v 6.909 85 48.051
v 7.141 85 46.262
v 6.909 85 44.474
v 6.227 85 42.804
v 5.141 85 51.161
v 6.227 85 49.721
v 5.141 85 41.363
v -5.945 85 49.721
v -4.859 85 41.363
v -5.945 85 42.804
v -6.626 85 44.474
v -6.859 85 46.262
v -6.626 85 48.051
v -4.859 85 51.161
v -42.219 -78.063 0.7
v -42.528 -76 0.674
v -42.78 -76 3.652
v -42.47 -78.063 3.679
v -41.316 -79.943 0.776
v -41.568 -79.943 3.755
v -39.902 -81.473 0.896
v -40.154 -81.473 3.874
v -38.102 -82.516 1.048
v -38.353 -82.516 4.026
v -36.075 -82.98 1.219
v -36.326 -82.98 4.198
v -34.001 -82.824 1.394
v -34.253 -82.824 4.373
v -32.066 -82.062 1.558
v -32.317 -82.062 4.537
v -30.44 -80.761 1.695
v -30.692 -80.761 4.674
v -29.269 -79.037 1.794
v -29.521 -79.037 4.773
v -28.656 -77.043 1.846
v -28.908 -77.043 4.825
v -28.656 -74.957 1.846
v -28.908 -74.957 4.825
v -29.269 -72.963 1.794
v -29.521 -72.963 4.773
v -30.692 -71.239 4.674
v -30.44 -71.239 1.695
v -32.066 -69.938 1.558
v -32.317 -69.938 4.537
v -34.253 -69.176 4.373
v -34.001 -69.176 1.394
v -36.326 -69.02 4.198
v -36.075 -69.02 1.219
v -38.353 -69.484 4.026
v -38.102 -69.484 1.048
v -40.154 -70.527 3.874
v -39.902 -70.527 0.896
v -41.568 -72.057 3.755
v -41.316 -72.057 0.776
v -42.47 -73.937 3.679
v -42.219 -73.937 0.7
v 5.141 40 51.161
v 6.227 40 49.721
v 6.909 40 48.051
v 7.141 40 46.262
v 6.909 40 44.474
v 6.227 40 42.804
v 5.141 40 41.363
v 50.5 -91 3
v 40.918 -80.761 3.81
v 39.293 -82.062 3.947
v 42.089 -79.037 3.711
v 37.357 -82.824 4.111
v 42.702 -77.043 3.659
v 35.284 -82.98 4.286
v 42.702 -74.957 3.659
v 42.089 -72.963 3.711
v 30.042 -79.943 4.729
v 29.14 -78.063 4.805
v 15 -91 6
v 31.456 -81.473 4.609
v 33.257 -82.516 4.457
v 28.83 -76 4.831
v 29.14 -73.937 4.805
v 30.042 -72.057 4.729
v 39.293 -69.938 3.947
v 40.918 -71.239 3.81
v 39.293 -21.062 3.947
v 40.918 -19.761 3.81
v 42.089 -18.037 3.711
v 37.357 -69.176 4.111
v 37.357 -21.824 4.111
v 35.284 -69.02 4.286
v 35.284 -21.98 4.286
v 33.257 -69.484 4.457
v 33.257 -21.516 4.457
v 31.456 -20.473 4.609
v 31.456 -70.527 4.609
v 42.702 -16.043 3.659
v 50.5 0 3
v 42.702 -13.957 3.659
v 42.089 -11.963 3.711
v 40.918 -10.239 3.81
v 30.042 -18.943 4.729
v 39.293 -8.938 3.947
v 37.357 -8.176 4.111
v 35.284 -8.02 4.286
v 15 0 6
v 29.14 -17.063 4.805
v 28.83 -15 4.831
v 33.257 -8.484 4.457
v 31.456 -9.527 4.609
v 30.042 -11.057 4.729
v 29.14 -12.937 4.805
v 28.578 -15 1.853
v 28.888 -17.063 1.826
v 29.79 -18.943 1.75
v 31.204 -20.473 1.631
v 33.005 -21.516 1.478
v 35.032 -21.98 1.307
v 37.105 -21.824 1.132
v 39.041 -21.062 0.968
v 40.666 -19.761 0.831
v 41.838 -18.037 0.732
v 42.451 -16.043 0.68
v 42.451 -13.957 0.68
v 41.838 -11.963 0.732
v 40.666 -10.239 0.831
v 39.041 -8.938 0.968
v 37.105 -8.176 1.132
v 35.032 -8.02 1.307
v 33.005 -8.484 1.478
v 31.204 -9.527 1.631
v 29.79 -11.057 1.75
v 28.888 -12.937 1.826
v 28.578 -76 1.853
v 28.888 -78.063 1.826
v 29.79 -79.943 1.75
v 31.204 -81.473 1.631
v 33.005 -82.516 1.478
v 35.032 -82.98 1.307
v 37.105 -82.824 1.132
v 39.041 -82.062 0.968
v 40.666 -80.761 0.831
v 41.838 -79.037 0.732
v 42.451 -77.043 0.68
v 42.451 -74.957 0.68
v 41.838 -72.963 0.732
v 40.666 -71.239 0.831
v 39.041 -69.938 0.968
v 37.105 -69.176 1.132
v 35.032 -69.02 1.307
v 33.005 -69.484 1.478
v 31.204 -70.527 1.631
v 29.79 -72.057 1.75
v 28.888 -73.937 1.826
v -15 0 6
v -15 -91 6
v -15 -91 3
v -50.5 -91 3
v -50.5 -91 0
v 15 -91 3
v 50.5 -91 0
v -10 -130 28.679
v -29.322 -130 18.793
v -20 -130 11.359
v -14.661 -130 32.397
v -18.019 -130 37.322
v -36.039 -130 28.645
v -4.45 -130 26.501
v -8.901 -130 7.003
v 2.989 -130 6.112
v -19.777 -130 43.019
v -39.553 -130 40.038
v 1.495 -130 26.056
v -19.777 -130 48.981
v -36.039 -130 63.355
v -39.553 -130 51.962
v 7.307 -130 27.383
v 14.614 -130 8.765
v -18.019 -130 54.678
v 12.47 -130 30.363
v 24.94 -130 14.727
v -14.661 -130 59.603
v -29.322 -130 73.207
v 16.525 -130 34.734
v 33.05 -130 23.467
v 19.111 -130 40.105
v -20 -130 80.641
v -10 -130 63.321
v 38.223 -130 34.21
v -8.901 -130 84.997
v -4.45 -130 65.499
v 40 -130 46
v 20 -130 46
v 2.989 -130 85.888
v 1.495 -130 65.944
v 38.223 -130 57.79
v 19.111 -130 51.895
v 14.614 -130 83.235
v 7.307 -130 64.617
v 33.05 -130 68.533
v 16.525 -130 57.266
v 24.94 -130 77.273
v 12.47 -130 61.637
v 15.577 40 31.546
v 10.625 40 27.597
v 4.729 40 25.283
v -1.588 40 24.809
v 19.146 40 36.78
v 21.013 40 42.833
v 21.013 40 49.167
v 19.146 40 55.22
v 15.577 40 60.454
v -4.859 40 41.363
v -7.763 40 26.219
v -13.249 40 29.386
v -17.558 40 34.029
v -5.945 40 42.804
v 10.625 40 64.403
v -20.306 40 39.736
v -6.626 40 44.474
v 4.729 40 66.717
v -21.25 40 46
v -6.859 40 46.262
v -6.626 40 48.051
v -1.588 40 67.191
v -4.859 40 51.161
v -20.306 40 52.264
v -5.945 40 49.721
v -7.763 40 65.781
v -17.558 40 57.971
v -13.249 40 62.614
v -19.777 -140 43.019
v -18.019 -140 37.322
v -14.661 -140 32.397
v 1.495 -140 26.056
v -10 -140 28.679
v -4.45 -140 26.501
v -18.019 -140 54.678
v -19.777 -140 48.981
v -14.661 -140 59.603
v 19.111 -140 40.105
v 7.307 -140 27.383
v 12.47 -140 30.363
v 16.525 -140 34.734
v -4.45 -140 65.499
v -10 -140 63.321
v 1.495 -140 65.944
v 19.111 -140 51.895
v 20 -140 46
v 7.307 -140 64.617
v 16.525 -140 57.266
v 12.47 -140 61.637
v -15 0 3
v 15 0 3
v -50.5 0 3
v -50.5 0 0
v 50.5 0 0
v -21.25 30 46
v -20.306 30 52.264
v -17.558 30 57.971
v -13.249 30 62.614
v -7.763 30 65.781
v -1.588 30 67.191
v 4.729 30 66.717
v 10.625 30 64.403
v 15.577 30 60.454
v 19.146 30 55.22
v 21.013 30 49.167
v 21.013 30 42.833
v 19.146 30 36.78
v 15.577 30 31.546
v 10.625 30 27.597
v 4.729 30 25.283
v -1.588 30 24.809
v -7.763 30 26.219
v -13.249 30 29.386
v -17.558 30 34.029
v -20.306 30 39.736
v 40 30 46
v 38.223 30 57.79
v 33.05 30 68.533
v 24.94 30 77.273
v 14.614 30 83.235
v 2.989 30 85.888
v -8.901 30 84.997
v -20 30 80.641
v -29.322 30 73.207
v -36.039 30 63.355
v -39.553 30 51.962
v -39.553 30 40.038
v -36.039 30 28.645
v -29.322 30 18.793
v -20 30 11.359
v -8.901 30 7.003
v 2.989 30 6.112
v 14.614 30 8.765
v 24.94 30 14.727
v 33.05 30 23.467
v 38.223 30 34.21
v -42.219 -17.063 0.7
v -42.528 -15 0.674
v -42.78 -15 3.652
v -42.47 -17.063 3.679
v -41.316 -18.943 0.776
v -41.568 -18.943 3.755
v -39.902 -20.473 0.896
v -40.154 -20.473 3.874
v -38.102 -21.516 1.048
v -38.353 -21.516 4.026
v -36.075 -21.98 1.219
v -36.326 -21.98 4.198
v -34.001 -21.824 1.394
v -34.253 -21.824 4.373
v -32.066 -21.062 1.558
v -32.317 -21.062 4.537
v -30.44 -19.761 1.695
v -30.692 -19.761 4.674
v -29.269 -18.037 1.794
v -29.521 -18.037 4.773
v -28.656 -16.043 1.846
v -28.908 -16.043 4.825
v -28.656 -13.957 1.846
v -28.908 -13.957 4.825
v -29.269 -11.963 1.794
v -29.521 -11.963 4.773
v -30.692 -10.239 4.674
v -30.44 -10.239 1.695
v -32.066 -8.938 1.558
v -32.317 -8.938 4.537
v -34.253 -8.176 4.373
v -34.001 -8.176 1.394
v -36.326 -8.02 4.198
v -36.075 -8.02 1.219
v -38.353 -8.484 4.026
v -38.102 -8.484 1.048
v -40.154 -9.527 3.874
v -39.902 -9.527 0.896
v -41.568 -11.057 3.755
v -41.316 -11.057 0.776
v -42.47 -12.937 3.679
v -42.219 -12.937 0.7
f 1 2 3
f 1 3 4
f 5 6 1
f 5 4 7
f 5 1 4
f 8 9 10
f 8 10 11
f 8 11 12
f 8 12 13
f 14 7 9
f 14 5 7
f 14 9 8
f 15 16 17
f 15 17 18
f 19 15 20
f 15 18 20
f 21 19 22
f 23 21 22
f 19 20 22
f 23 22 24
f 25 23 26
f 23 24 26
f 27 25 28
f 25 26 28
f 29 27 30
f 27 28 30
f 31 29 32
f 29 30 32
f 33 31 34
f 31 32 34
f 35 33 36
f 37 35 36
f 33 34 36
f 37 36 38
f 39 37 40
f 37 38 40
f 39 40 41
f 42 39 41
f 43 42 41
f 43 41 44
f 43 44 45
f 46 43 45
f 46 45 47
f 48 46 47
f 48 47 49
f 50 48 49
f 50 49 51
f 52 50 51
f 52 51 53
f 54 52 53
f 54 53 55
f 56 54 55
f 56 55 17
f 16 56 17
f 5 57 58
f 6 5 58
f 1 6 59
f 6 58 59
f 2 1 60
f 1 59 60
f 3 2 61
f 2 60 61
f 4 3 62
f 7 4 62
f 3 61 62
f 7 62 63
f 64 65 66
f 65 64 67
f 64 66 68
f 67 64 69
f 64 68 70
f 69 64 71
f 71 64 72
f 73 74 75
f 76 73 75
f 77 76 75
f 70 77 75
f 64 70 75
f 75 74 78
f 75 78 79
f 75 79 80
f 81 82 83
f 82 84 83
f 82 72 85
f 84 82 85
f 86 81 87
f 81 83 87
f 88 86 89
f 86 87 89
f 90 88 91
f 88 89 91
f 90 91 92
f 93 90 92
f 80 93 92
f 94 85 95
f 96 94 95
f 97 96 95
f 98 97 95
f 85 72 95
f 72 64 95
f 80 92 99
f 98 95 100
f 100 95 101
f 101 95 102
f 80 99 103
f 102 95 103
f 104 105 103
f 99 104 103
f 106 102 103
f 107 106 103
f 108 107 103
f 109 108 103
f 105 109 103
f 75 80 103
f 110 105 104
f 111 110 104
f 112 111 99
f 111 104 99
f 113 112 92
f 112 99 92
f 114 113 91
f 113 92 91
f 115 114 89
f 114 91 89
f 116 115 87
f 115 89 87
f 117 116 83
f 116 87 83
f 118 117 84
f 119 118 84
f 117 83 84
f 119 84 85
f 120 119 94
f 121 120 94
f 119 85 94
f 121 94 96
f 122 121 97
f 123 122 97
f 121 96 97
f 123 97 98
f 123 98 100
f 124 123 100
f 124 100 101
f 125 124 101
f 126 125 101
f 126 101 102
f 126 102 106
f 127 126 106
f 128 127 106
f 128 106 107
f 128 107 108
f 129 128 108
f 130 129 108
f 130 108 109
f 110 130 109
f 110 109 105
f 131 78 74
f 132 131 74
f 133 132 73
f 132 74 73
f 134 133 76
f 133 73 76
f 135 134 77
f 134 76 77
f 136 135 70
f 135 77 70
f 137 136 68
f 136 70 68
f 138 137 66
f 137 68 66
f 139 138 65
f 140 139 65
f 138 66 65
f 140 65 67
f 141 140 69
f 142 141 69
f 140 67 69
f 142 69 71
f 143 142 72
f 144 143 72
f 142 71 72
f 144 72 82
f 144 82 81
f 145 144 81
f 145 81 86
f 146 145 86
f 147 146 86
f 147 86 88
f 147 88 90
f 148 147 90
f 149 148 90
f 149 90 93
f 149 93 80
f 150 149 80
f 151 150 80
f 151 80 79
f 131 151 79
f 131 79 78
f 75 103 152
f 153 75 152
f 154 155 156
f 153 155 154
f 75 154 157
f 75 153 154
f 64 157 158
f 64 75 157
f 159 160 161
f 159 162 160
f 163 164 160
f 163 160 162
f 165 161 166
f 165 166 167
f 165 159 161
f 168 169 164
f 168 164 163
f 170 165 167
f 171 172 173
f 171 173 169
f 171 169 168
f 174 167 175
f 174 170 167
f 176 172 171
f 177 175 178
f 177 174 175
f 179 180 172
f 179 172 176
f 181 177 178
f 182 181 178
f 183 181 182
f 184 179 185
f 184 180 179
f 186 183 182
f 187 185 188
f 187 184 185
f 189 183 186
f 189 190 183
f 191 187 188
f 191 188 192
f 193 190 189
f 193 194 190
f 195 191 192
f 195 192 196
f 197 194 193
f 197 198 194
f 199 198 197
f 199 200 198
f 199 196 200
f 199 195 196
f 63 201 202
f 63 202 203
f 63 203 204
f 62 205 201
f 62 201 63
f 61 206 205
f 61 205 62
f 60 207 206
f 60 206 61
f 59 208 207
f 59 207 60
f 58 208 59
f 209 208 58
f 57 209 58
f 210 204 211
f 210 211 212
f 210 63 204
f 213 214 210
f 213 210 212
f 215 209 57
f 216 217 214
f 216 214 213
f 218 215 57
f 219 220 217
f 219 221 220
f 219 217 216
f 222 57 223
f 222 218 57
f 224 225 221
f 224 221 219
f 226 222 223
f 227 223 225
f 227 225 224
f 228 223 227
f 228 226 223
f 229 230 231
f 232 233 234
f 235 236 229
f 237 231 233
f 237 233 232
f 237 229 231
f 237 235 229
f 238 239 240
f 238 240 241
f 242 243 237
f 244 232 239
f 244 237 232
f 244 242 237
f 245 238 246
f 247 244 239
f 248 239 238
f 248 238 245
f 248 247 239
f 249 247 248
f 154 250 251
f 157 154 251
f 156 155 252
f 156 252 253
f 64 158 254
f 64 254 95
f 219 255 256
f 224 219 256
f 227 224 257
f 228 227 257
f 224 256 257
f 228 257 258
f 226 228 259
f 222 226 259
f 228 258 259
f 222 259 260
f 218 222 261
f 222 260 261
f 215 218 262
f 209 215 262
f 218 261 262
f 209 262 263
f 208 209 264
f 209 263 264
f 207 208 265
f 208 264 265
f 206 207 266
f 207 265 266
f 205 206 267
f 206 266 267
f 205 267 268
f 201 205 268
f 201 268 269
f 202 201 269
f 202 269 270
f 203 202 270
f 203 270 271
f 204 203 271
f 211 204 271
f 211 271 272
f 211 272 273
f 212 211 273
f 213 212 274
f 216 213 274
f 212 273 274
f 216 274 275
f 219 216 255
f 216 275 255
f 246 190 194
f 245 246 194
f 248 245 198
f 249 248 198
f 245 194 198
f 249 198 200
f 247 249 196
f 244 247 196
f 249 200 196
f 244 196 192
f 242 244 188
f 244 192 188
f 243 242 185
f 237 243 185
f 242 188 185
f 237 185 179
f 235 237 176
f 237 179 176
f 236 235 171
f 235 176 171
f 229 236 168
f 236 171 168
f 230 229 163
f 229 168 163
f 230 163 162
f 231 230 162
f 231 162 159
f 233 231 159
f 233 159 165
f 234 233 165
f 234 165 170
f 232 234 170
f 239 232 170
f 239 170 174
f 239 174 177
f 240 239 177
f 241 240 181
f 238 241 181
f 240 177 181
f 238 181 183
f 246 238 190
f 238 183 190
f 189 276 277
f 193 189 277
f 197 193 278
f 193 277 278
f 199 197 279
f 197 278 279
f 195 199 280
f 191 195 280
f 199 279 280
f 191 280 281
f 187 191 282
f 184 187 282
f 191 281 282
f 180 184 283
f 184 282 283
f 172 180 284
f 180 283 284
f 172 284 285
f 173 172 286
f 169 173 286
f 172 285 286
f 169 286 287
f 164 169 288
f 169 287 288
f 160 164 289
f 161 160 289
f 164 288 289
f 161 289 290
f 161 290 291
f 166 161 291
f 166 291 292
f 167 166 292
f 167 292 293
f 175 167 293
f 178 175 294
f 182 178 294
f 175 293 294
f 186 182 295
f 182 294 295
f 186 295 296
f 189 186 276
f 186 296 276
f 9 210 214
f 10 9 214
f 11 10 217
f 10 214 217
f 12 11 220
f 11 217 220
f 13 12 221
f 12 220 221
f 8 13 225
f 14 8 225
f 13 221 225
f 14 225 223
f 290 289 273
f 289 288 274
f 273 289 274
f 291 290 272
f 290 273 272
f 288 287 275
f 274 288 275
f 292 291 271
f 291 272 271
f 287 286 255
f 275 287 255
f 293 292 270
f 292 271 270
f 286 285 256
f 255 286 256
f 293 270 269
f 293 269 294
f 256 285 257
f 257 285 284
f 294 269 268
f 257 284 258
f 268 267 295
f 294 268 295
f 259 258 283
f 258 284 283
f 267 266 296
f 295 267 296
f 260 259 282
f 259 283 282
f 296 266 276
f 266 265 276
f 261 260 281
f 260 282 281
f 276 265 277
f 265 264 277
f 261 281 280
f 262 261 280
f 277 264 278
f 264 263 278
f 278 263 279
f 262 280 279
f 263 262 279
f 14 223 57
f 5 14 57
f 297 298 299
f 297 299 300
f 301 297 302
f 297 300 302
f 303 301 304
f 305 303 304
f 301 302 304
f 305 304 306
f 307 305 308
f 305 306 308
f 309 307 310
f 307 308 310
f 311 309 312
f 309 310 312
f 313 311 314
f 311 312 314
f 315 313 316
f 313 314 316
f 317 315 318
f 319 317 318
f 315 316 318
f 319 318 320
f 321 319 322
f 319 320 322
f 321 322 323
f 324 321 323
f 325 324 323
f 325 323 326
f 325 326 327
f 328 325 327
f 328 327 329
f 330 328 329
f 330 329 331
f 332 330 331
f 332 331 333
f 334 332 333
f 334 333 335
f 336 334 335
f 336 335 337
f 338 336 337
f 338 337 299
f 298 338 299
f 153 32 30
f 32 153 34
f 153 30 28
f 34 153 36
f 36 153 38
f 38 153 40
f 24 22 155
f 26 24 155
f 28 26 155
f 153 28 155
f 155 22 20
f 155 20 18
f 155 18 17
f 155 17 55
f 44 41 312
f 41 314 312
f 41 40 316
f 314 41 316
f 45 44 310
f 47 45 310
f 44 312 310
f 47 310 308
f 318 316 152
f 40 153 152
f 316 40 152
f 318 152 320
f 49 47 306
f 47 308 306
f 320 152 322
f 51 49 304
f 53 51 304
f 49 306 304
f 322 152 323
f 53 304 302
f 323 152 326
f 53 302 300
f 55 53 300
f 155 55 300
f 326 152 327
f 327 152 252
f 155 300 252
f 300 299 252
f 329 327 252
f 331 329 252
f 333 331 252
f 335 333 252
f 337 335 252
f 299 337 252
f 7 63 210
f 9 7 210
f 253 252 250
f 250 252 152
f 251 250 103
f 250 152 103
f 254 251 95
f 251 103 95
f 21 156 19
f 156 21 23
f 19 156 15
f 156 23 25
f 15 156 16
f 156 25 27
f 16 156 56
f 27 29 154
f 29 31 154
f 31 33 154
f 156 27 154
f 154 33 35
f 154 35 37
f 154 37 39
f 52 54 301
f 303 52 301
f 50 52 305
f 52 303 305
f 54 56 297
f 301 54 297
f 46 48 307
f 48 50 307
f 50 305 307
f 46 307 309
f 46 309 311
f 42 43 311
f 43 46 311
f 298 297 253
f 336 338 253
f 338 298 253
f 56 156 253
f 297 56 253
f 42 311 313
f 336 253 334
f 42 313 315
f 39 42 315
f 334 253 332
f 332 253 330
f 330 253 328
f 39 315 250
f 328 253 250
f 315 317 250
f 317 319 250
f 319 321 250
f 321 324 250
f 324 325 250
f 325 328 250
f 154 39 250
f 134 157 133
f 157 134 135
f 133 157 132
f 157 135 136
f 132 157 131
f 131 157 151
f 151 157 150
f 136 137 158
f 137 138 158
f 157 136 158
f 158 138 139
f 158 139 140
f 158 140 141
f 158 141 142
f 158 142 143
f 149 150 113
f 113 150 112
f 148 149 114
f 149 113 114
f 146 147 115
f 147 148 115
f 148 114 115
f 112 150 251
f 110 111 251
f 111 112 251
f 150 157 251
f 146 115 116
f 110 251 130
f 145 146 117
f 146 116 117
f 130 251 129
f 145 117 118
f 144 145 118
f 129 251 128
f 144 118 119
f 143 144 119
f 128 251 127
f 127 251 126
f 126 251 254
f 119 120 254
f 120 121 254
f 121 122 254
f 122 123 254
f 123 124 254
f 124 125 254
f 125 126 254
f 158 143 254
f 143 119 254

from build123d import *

# Parameters (mm, degrees)
F1_DEPTH   = 91
F4_D       = 14
F4_ON_F3_D = 14
F6_R       = 40
F7_DEPTH   = 160
F8_R       = 20
F9_DEPTH   = 10
F10_R      = 21.25
F11_DEPTH  = 10
F13_DEPTH  = 45


with BuildPart() as f1:
    # F0 (on Front) → F1 (new body)
    with BuildSketch(Plane.XZ):
        Polygon((-50.5, 3), (-50.5, 0), (-15, 3), (15, 3), (50.5, 0), (50.5, 3), (15, 6), (-15, 6), align=None)
    extrude(amount=F1_DEPTH)

    # F4 (through all)
    with Locations(Plane(origin=(-0.3580854836, 0, 4.2373448887), x_dir=(0.9964482919, 0, 0.0842068979), z_dir=(0.0842068979, 0, -0.9964482919))):
        with Locations((-35.3206387388, 76), (-35.3206387388, 15)):
            Hole(F4_D / 2)

    # F4 on F3 (through all)
    with Locations(Plane(origin=(0.3580854836, 0, 4.2373448887), x_dir=(0.9964482919, 0, -0.0842068979), z_dir=(-0.0842068979, 0, -0.9964482919))):
        with Locations((35.3206387388, 76), (35.3206387388, 15)):
            Hole(F4_ON_F3_D / 2)


with BuildPart() as f7:
    # F6 (on offset) → F7 (new body)
    with BuildSketch(Plane.XZ.offset(-30)):
        with Locations((0, 46)):
            Circle(F6_R)
    extrude(amount=F7_DEPTH)

    # F8 (on face) → F9 (join)
    with BuildSketch(Plane.XZ.offset(130)):
        with Locations((0, 46)):
            Circle(F8_R)
    extrude(amount=F9_DEPTH)

    # F10 (on face) → F11 (join)
    with BuildSketch(Plane(origin=(0, 30, 0), x_dir=(-1, 0, 0), z_dir=(0, 1, 0))):
        with Locations((0, 46)):
            Circle(F10_R)
    extrude(amount=F11_DEPTH)

    # F12 (on face) → F13 (join)
    with BuildSketch(Plane(origin=(0, 40, 0), x_dir=(-1, 0, 0), z_dir=(0, 1, 0))):
        with BuildLine():
            Line((4.8587004589, 51.1613599355), (-5.1412995411, 51.1613599355))
            ThreePointArc((-5.1412995411, 51.1613599355), (-7.1412995411, 46.2623804499), (-5.1412995411, 41.3634009644))
            Line((-5.1412995411, 41.3634009644), (4.8587004589, 41.3634009644))
            ThreePointArc((4.8587004589, 41.3634009644), (6.8587004589, 46.2623804499), (4.8587004589, 51.1613599355))
        make_face()
    extrude(amount=F13_DEPTH)


solid = Compound([f1.part, f7.part])
